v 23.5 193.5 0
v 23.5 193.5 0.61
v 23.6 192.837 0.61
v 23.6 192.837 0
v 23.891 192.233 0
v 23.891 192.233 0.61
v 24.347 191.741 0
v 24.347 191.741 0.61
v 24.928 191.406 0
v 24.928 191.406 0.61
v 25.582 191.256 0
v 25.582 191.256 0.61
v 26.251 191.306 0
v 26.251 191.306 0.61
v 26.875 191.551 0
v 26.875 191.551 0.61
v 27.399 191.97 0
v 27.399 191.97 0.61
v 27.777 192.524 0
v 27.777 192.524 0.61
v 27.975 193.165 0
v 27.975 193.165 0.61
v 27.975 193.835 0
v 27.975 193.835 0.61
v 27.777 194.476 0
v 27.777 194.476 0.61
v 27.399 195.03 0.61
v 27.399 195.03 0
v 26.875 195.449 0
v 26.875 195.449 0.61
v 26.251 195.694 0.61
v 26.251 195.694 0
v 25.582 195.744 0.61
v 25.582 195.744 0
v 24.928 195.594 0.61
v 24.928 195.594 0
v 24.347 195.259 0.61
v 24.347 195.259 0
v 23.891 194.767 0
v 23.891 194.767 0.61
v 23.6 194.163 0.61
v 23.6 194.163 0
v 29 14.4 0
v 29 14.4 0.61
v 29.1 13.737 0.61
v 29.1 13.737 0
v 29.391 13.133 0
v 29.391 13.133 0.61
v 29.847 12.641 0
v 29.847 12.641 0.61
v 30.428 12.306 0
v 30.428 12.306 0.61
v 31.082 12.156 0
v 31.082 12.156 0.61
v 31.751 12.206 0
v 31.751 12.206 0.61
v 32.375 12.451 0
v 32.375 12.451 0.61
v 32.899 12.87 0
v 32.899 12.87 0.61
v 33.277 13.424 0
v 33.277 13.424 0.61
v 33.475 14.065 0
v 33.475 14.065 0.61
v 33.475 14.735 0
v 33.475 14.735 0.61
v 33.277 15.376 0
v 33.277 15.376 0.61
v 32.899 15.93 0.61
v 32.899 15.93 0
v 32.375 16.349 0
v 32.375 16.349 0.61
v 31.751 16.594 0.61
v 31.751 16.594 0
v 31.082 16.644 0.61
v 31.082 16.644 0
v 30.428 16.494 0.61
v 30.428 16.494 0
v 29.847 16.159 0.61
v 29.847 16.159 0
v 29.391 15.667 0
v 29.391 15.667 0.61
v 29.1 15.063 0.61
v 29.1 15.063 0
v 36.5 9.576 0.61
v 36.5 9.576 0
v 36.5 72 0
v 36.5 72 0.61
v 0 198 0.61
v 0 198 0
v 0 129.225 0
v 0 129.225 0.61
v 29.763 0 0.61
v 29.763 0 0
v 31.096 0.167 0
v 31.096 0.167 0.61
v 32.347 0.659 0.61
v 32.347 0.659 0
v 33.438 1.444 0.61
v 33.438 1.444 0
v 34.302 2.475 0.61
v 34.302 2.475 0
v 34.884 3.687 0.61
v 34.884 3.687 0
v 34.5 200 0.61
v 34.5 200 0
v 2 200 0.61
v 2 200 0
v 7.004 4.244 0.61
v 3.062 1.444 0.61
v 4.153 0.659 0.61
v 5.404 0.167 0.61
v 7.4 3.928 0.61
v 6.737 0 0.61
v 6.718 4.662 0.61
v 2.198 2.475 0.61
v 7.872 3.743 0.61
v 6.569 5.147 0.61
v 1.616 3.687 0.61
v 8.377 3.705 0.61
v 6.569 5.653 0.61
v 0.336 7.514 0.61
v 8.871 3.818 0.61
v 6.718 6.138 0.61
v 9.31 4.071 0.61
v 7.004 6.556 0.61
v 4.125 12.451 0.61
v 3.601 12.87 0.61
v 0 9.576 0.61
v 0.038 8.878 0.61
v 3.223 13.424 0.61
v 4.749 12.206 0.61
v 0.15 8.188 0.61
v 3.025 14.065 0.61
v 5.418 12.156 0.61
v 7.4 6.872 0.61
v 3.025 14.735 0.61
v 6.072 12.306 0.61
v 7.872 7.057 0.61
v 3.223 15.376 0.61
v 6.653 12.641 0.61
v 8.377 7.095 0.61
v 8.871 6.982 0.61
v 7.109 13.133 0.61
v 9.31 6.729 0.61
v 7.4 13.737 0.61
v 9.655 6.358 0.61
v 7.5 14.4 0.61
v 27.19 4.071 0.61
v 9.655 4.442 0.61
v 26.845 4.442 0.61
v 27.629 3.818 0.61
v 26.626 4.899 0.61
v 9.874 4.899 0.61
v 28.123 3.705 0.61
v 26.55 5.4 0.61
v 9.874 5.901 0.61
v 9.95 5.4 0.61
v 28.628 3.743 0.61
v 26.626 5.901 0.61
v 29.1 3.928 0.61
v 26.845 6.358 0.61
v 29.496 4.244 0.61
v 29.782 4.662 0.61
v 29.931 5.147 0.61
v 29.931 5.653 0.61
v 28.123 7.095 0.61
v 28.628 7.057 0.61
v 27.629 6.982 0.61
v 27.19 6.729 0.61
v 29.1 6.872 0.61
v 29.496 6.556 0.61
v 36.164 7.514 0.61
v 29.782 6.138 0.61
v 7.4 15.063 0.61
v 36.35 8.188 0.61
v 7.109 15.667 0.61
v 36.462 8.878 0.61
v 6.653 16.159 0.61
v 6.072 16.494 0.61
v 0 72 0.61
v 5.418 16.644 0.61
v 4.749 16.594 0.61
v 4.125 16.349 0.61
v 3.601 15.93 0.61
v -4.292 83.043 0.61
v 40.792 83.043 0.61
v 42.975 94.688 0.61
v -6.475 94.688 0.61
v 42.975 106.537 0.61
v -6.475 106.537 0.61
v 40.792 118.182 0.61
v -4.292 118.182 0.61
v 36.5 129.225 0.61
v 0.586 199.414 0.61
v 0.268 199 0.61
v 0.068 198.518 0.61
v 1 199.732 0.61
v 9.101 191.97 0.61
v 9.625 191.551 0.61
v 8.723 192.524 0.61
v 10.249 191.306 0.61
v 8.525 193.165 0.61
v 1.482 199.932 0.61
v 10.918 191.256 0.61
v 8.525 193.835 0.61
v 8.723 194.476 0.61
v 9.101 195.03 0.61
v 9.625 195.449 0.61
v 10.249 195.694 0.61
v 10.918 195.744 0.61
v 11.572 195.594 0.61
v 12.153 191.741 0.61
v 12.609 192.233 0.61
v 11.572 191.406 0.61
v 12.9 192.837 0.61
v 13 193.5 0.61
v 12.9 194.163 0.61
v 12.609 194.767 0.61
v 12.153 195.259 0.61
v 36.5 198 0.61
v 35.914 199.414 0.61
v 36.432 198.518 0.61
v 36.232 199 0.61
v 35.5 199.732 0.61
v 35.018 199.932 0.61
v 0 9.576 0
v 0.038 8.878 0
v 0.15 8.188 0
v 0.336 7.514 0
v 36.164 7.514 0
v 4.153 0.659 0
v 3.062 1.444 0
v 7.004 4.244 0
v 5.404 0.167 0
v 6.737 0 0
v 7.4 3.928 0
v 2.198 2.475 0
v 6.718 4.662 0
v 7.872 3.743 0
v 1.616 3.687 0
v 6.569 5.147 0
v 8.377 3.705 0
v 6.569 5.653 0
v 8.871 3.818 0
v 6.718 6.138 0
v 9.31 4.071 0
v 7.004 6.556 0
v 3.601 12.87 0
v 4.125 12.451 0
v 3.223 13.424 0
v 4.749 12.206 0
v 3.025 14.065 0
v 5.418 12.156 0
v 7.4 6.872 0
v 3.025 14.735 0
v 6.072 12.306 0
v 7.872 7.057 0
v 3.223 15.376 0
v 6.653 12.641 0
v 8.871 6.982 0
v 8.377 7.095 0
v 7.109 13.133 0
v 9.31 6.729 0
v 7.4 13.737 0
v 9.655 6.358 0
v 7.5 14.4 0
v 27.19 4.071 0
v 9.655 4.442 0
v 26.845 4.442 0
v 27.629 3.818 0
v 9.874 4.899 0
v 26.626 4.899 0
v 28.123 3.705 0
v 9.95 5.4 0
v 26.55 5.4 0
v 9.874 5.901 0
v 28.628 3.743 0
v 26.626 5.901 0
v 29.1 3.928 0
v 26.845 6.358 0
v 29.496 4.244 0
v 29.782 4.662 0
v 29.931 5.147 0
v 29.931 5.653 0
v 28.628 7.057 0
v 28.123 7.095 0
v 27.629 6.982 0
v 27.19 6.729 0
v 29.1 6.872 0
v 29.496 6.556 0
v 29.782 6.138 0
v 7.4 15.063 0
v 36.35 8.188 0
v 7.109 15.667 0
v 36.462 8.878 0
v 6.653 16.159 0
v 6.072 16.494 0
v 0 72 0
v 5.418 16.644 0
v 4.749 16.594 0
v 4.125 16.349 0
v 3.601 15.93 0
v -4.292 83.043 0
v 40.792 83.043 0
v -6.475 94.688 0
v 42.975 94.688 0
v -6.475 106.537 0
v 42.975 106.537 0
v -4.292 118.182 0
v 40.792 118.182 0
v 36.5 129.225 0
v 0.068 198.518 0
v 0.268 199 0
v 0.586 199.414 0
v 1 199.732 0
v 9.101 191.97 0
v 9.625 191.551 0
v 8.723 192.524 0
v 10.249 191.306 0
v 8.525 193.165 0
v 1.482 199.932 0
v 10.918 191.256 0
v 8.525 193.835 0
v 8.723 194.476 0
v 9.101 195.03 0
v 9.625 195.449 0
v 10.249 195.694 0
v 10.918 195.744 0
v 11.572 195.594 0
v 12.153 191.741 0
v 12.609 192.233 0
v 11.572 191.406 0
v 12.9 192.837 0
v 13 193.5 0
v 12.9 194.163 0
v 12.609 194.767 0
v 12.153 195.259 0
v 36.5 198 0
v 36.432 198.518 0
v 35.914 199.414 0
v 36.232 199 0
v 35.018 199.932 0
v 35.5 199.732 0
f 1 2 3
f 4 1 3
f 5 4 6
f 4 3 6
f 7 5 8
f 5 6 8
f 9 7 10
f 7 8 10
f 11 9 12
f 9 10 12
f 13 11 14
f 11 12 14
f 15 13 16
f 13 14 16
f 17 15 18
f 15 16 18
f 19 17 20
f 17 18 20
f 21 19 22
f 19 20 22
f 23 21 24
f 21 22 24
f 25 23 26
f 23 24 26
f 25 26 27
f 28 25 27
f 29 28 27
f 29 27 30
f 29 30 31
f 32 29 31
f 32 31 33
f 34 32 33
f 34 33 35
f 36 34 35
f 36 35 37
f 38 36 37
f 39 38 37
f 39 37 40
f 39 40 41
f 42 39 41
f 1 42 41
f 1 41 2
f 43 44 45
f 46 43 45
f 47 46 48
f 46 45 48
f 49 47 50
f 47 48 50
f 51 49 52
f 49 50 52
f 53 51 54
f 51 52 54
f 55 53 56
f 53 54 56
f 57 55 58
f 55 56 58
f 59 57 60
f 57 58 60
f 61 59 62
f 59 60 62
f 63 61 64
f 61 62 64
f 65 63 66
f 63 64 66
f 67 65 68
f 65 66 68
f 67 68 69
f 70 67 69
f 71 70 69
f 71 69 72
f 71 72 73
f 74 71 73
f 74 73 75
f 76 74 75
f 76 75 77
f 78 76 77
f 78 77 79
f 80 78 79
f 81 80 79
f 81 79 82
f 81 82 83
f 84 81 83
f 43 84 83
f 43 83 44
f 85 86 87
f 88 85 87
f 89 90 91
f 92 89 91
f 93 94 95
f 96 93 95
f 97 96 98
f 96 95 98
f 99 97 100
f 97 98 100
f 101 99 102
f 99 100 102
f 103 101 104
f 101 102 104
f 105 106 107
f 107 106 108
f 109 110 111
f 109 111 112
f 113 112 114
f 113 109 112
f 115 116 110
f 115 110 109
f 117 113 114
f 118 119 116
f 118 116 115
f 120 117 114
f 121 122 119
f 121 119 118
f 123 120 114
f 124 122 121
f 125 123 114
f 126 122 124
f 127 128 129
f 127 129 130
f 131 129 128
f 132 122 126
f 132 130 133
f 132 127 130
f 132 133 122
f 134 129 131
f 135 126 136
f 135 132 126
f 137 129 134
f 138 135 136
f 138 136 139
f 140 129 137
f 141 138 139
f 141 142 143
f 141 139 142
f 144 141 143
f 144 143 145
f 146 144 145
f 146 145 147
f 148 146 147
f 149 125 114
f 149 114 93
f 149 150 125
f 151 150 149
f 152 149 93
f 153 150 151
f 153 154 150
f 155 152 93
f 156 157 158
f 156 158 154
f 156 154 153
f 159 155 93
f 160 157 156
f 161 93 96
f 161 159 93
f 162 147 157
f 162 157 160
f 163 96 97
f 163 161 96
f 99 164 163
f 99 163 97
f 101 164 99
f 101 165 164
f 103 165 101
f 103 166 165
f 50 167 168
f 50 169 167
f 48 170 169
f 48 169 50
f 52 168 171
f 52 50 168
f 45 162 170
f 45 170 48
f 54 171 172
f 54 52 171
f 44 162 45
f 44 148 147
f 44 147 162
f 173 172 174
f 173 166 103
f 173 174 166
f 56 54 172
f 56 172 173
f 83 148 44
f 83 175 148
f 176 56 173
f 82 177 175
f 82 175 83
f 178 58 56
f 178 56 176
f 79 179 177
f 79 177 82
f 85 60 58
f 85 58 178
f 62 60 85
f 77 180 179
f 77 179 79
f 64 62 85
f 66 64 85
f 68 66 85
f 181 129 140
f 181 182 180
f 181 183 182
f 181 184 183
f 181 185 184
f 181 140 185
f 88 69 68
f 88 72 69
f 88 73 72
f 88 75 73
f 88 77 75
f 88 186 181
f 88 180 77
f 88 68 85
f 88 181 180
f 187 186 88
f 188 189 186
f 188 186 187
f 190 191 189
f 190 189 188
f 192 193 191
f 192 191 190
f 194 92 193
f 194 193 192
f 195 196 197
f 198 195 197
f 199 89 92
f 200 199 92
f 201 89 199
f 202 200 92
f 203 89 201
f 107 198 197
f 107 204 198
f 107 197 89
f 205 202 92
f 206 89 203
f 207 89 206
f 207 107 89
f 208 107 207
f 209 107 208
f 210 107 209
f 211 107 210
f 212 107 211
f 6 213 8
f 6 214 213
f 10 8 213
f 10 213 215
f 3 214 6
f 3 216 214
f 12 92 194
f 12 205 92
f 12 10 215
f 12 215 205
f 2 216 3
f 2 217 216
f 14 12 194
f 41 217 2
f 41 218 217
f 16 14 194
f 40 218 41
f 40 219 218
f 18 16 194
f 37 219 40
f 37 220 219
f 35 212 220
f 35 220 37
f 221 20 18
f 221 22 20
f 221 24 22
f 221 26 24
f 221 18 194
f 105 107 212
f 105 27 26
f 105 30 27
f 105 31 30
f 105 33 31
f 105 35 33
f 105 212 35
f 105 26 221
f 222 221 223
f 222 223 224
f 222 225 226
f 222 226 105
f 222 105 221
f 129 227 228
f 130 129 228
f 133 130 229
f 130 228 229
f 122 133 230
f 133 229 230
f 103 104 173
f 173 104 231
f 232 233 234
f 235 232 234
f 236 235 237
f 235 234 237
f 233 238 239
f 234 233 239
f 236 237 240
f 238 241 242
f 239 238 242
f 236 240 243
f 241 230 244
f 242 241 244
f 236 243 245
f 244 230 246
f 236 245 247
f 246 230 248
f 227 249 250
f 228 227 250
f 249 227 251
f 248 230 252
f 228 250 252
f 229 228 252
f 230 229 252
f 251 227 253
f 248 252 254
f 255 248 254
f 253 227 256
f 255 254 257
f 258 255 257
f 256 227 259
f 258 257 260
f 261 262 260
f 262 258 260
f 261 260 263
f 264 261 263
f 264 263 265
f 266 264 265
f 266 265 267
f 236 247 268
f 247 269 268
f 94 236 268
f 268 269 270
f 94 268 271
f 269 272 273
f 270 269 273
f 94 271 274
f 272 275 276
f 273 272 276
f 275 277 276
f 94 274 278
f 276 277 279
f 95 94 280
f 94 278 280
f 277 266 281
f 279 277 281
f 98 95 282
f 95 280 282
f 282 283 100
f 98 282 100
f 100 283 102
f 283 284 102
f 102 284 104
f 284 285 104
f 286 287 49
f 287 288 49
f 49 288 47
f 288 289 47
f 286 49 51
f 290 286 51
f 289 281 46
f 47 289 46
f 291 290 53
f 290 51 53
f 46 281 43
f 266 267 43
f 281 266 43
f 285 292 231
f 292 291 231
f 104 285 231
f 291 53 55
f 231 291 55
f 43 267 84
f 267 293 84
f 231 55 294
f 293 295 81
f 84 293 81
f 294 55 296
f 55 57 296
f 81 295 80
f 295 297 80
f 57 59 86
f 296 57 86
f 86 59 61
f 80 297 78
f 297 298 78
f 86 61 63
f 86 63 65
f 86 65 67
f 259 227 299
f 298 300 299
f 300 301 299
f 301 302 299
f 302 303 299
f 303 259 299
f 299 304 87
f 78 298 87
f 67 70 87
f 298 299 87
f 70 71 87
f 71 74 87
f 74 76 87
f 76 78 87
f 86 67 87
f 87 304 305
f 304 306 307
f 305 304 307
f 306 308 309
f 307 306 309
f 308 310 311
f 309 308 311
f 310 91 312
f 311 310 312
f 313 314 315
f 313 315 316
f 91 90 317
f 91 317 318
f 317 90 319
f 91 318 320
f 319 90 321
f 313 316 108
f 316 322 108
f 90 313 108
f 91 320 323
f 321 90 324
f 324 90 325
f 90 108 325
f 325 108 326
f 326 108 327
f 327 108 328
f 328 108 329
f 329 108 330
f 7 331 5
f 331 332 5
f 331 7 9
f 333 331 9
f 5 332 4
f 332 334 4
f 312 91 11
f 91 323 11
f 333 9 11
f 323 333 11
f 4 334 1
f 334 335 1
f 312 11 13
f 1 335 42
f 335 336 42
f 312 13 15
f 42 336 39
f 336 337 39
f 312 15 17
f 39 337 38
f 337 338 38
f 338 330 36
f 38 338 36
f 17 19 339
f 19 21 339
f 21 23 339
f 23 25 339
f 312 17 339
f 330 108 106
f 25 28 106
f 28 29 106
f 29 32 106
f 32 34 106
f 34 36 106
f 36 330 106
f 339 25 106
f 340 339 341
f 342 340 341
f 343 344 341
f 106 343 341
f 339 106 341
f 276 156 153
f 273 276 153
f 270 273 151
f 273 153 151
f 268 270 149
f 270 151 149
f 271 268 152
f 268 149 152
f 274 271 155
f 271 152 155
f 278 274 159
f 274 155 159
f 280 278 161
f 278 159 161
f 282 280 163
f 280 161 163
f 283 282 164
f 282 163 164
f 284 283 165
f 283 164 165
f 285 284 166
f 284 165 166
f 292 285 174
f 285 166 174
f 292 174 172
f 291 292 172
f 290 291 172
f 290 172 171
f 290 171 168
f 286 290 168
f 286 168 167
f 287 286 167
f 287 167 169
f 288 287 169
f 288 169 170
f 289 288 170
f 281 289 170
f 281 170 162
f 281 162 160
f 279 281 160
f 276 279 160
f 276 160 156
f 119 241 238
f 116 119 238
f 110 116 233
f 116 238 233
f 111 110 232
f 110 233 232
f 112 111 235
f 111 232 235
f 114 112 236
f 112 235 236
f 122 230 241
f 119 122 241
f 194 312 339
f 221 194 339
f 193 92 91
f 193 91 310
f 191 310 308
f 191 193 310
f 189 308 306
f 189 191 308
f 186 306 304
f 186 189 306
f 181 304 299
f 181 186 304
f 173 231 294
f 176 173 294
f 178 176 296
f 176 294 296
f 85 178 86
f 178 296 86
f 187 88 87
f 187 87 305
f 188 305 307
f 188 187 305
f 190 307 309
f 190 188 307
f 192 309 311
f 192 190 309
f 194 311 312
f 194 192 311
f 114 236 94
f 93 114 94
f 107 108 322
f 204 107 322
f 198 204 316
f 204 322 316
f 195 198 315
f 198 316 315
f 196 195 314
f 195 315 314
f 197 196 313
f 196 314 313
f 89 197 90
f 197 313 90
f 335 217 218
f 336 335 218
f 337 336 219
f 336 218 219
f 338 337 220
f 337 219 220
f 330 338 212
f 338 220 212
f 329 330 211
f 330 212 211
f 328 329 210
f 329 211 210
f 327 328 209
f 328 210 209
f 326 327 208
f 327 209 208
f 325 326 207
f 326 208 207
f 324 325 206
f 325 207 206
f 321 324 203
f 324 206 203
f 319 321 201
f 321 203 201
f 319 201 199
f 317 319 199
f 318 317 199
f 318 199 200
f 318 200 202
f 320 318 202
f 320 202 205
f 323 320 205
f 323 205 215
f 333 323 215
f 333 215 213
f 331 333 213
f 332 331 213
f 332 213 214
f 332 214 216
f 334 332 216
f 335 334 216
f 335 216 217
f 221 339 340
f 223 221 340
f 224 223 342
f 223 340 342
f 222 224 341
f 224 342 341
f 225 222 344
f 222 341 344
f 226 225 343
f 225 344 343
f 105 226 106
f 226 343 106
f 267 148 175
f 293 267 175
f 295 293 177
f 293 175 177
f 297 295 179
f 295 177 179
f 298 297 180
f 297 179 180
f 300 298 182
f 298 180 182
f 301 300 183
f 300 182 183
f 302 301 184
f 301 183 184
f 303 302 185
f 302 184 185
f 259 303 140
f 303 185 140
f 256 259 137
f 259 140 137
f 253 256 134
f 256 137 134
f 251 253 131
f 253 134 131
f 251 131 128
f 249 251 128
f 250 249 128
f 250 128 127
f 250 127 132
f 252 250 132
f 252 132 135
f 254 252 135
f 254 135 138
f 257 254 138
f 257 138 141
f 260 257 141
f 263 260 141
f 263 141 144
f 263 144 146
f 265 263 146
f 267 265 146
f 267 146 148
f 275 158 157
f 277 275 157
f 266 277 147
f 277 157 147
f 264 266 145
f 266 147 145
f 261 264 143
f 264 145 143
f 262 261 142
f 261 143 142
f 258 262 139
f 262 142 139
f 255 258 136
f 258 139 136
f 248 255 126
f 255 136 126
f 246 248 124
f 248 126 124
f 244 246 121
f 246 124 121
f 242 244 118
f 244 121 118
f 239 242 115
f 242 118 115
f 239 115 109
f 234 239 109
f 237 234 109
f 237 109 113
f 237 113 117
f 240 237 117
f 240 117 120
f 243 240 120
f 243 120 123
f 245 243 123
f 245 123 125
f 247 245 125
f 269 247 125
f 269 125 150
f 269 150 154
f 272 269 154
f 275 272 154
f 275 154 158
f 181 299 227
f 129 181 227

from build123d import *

# Parameters (mm, degrees)
BOSS_EXTRUDE1_DEPTH = 0.6096
SKETCH3_R           = 1.7
SKETCH3_R_2         = 2.25
CUT_EXTRUDE1_DEPTH  = 204.304258716
SKETCH4_W           = 18.25
SKETCH4_H           = 57.225
BOSS_EXTRUDE2_DEPTH = 0.6096


with BuildPart() as part:
    # Sketch2 → Boss-Extrude1 (new body)
    with BuildSketch(Plane.XY):
        with BuildLine():
            Line((34.883504, 3.686554855), (36.164103759, 7.513864099))
            ThreePointArc((36.164103759, 7.513864099), (36.415476383, 8.531517689), (36.5, 9.576344365))
            Line((36.5, 9.576344365), (36.5, 198))
            ThreePointArc((36.5, 198), (35.914213562, 199.414213562), (34.5, 200))
            Line((34.5, 200), (2, 200))
            ThreePointArc((2, 200), (0.585786438, 199.414213562), (0, 198))
            Line((0, 198), (0, 9.576344365))
            ThreePointArc((0, 9.576344365), (0.084523617, 8.531517689), (0.335896241, 7.513864099))
            Line((0.335896241, 7.513864099), (1.616496, 3.686554855))
            ThreePointArc((1.616496, 3.686554855), (3.582495544, 1.017500497), (6.737443738, 0))
            Line((6.737443738, 0), (29.762556262, 0))
            ThreePointArc((29.762556262, 0), (32.917504456, 1.017500497), (34.883504, 3.686554855))
        make_face()
    extrude(amount=BOSS_EXTRUDE1_DEPTH)

    # Sketch3 → Cut-Extrude1 (cut, through all)
    with BuildSketch(Plane.XY.offset(0.6096)):
        with Locations((8.25, 5.4)):
            Circle(SKETCH3_R)
        with Locations((5.25, 14.4)):
            Circle(SKETCH3_R_2)
        with Locations((10.75, 193.5)):
            Circle(SKETCH3_R_2)
        with Locations(Location((28.25, 5.4, 0), (0, 0, 180))):
            Circle(SKETCH3_R)
        with Locations(Location((31.25, 14.4, 0), (0, 0, 180))):
            Circle(SKETCH3_R_2)
        with Locations(Location((25.75, 193.5, 0), (0, 0, 180))):
            Circle(SKETCH3_R_2)
    extrude(amount=-CUT_EXTRUDE1_DEPTH, mode=Mode.SUBTRACT)

    # Sketch4 → Boss-Extrude2 (add)
    with BuildSketch(Plane.XY.offset(0.6096)):
        with Locations((9.125, 100.6125)):
            Rectangle(SKETCH4_W, SKETCH4_H)
        with BuildLine():
            ThreePointArc((0, 129.225), (-6.75, 100.6125), (0, 72))
            Line((0, 72), (0, 129.225))
        make_face()
        with Locations((27.375, 100.6125)):
            Rectangle(SKETCH4_W, SKETCH4_H)
        with BuildLine():
            Line((36.5, 129.225), (36.5, 72))
            ThreePointArc((36.5, 72), (43.25, 100.6125), (36.5, 129.225))
        make_face()
    extrude(amount=-BOSS_EXTRUDE2_DEPTH)


solid = part.part
